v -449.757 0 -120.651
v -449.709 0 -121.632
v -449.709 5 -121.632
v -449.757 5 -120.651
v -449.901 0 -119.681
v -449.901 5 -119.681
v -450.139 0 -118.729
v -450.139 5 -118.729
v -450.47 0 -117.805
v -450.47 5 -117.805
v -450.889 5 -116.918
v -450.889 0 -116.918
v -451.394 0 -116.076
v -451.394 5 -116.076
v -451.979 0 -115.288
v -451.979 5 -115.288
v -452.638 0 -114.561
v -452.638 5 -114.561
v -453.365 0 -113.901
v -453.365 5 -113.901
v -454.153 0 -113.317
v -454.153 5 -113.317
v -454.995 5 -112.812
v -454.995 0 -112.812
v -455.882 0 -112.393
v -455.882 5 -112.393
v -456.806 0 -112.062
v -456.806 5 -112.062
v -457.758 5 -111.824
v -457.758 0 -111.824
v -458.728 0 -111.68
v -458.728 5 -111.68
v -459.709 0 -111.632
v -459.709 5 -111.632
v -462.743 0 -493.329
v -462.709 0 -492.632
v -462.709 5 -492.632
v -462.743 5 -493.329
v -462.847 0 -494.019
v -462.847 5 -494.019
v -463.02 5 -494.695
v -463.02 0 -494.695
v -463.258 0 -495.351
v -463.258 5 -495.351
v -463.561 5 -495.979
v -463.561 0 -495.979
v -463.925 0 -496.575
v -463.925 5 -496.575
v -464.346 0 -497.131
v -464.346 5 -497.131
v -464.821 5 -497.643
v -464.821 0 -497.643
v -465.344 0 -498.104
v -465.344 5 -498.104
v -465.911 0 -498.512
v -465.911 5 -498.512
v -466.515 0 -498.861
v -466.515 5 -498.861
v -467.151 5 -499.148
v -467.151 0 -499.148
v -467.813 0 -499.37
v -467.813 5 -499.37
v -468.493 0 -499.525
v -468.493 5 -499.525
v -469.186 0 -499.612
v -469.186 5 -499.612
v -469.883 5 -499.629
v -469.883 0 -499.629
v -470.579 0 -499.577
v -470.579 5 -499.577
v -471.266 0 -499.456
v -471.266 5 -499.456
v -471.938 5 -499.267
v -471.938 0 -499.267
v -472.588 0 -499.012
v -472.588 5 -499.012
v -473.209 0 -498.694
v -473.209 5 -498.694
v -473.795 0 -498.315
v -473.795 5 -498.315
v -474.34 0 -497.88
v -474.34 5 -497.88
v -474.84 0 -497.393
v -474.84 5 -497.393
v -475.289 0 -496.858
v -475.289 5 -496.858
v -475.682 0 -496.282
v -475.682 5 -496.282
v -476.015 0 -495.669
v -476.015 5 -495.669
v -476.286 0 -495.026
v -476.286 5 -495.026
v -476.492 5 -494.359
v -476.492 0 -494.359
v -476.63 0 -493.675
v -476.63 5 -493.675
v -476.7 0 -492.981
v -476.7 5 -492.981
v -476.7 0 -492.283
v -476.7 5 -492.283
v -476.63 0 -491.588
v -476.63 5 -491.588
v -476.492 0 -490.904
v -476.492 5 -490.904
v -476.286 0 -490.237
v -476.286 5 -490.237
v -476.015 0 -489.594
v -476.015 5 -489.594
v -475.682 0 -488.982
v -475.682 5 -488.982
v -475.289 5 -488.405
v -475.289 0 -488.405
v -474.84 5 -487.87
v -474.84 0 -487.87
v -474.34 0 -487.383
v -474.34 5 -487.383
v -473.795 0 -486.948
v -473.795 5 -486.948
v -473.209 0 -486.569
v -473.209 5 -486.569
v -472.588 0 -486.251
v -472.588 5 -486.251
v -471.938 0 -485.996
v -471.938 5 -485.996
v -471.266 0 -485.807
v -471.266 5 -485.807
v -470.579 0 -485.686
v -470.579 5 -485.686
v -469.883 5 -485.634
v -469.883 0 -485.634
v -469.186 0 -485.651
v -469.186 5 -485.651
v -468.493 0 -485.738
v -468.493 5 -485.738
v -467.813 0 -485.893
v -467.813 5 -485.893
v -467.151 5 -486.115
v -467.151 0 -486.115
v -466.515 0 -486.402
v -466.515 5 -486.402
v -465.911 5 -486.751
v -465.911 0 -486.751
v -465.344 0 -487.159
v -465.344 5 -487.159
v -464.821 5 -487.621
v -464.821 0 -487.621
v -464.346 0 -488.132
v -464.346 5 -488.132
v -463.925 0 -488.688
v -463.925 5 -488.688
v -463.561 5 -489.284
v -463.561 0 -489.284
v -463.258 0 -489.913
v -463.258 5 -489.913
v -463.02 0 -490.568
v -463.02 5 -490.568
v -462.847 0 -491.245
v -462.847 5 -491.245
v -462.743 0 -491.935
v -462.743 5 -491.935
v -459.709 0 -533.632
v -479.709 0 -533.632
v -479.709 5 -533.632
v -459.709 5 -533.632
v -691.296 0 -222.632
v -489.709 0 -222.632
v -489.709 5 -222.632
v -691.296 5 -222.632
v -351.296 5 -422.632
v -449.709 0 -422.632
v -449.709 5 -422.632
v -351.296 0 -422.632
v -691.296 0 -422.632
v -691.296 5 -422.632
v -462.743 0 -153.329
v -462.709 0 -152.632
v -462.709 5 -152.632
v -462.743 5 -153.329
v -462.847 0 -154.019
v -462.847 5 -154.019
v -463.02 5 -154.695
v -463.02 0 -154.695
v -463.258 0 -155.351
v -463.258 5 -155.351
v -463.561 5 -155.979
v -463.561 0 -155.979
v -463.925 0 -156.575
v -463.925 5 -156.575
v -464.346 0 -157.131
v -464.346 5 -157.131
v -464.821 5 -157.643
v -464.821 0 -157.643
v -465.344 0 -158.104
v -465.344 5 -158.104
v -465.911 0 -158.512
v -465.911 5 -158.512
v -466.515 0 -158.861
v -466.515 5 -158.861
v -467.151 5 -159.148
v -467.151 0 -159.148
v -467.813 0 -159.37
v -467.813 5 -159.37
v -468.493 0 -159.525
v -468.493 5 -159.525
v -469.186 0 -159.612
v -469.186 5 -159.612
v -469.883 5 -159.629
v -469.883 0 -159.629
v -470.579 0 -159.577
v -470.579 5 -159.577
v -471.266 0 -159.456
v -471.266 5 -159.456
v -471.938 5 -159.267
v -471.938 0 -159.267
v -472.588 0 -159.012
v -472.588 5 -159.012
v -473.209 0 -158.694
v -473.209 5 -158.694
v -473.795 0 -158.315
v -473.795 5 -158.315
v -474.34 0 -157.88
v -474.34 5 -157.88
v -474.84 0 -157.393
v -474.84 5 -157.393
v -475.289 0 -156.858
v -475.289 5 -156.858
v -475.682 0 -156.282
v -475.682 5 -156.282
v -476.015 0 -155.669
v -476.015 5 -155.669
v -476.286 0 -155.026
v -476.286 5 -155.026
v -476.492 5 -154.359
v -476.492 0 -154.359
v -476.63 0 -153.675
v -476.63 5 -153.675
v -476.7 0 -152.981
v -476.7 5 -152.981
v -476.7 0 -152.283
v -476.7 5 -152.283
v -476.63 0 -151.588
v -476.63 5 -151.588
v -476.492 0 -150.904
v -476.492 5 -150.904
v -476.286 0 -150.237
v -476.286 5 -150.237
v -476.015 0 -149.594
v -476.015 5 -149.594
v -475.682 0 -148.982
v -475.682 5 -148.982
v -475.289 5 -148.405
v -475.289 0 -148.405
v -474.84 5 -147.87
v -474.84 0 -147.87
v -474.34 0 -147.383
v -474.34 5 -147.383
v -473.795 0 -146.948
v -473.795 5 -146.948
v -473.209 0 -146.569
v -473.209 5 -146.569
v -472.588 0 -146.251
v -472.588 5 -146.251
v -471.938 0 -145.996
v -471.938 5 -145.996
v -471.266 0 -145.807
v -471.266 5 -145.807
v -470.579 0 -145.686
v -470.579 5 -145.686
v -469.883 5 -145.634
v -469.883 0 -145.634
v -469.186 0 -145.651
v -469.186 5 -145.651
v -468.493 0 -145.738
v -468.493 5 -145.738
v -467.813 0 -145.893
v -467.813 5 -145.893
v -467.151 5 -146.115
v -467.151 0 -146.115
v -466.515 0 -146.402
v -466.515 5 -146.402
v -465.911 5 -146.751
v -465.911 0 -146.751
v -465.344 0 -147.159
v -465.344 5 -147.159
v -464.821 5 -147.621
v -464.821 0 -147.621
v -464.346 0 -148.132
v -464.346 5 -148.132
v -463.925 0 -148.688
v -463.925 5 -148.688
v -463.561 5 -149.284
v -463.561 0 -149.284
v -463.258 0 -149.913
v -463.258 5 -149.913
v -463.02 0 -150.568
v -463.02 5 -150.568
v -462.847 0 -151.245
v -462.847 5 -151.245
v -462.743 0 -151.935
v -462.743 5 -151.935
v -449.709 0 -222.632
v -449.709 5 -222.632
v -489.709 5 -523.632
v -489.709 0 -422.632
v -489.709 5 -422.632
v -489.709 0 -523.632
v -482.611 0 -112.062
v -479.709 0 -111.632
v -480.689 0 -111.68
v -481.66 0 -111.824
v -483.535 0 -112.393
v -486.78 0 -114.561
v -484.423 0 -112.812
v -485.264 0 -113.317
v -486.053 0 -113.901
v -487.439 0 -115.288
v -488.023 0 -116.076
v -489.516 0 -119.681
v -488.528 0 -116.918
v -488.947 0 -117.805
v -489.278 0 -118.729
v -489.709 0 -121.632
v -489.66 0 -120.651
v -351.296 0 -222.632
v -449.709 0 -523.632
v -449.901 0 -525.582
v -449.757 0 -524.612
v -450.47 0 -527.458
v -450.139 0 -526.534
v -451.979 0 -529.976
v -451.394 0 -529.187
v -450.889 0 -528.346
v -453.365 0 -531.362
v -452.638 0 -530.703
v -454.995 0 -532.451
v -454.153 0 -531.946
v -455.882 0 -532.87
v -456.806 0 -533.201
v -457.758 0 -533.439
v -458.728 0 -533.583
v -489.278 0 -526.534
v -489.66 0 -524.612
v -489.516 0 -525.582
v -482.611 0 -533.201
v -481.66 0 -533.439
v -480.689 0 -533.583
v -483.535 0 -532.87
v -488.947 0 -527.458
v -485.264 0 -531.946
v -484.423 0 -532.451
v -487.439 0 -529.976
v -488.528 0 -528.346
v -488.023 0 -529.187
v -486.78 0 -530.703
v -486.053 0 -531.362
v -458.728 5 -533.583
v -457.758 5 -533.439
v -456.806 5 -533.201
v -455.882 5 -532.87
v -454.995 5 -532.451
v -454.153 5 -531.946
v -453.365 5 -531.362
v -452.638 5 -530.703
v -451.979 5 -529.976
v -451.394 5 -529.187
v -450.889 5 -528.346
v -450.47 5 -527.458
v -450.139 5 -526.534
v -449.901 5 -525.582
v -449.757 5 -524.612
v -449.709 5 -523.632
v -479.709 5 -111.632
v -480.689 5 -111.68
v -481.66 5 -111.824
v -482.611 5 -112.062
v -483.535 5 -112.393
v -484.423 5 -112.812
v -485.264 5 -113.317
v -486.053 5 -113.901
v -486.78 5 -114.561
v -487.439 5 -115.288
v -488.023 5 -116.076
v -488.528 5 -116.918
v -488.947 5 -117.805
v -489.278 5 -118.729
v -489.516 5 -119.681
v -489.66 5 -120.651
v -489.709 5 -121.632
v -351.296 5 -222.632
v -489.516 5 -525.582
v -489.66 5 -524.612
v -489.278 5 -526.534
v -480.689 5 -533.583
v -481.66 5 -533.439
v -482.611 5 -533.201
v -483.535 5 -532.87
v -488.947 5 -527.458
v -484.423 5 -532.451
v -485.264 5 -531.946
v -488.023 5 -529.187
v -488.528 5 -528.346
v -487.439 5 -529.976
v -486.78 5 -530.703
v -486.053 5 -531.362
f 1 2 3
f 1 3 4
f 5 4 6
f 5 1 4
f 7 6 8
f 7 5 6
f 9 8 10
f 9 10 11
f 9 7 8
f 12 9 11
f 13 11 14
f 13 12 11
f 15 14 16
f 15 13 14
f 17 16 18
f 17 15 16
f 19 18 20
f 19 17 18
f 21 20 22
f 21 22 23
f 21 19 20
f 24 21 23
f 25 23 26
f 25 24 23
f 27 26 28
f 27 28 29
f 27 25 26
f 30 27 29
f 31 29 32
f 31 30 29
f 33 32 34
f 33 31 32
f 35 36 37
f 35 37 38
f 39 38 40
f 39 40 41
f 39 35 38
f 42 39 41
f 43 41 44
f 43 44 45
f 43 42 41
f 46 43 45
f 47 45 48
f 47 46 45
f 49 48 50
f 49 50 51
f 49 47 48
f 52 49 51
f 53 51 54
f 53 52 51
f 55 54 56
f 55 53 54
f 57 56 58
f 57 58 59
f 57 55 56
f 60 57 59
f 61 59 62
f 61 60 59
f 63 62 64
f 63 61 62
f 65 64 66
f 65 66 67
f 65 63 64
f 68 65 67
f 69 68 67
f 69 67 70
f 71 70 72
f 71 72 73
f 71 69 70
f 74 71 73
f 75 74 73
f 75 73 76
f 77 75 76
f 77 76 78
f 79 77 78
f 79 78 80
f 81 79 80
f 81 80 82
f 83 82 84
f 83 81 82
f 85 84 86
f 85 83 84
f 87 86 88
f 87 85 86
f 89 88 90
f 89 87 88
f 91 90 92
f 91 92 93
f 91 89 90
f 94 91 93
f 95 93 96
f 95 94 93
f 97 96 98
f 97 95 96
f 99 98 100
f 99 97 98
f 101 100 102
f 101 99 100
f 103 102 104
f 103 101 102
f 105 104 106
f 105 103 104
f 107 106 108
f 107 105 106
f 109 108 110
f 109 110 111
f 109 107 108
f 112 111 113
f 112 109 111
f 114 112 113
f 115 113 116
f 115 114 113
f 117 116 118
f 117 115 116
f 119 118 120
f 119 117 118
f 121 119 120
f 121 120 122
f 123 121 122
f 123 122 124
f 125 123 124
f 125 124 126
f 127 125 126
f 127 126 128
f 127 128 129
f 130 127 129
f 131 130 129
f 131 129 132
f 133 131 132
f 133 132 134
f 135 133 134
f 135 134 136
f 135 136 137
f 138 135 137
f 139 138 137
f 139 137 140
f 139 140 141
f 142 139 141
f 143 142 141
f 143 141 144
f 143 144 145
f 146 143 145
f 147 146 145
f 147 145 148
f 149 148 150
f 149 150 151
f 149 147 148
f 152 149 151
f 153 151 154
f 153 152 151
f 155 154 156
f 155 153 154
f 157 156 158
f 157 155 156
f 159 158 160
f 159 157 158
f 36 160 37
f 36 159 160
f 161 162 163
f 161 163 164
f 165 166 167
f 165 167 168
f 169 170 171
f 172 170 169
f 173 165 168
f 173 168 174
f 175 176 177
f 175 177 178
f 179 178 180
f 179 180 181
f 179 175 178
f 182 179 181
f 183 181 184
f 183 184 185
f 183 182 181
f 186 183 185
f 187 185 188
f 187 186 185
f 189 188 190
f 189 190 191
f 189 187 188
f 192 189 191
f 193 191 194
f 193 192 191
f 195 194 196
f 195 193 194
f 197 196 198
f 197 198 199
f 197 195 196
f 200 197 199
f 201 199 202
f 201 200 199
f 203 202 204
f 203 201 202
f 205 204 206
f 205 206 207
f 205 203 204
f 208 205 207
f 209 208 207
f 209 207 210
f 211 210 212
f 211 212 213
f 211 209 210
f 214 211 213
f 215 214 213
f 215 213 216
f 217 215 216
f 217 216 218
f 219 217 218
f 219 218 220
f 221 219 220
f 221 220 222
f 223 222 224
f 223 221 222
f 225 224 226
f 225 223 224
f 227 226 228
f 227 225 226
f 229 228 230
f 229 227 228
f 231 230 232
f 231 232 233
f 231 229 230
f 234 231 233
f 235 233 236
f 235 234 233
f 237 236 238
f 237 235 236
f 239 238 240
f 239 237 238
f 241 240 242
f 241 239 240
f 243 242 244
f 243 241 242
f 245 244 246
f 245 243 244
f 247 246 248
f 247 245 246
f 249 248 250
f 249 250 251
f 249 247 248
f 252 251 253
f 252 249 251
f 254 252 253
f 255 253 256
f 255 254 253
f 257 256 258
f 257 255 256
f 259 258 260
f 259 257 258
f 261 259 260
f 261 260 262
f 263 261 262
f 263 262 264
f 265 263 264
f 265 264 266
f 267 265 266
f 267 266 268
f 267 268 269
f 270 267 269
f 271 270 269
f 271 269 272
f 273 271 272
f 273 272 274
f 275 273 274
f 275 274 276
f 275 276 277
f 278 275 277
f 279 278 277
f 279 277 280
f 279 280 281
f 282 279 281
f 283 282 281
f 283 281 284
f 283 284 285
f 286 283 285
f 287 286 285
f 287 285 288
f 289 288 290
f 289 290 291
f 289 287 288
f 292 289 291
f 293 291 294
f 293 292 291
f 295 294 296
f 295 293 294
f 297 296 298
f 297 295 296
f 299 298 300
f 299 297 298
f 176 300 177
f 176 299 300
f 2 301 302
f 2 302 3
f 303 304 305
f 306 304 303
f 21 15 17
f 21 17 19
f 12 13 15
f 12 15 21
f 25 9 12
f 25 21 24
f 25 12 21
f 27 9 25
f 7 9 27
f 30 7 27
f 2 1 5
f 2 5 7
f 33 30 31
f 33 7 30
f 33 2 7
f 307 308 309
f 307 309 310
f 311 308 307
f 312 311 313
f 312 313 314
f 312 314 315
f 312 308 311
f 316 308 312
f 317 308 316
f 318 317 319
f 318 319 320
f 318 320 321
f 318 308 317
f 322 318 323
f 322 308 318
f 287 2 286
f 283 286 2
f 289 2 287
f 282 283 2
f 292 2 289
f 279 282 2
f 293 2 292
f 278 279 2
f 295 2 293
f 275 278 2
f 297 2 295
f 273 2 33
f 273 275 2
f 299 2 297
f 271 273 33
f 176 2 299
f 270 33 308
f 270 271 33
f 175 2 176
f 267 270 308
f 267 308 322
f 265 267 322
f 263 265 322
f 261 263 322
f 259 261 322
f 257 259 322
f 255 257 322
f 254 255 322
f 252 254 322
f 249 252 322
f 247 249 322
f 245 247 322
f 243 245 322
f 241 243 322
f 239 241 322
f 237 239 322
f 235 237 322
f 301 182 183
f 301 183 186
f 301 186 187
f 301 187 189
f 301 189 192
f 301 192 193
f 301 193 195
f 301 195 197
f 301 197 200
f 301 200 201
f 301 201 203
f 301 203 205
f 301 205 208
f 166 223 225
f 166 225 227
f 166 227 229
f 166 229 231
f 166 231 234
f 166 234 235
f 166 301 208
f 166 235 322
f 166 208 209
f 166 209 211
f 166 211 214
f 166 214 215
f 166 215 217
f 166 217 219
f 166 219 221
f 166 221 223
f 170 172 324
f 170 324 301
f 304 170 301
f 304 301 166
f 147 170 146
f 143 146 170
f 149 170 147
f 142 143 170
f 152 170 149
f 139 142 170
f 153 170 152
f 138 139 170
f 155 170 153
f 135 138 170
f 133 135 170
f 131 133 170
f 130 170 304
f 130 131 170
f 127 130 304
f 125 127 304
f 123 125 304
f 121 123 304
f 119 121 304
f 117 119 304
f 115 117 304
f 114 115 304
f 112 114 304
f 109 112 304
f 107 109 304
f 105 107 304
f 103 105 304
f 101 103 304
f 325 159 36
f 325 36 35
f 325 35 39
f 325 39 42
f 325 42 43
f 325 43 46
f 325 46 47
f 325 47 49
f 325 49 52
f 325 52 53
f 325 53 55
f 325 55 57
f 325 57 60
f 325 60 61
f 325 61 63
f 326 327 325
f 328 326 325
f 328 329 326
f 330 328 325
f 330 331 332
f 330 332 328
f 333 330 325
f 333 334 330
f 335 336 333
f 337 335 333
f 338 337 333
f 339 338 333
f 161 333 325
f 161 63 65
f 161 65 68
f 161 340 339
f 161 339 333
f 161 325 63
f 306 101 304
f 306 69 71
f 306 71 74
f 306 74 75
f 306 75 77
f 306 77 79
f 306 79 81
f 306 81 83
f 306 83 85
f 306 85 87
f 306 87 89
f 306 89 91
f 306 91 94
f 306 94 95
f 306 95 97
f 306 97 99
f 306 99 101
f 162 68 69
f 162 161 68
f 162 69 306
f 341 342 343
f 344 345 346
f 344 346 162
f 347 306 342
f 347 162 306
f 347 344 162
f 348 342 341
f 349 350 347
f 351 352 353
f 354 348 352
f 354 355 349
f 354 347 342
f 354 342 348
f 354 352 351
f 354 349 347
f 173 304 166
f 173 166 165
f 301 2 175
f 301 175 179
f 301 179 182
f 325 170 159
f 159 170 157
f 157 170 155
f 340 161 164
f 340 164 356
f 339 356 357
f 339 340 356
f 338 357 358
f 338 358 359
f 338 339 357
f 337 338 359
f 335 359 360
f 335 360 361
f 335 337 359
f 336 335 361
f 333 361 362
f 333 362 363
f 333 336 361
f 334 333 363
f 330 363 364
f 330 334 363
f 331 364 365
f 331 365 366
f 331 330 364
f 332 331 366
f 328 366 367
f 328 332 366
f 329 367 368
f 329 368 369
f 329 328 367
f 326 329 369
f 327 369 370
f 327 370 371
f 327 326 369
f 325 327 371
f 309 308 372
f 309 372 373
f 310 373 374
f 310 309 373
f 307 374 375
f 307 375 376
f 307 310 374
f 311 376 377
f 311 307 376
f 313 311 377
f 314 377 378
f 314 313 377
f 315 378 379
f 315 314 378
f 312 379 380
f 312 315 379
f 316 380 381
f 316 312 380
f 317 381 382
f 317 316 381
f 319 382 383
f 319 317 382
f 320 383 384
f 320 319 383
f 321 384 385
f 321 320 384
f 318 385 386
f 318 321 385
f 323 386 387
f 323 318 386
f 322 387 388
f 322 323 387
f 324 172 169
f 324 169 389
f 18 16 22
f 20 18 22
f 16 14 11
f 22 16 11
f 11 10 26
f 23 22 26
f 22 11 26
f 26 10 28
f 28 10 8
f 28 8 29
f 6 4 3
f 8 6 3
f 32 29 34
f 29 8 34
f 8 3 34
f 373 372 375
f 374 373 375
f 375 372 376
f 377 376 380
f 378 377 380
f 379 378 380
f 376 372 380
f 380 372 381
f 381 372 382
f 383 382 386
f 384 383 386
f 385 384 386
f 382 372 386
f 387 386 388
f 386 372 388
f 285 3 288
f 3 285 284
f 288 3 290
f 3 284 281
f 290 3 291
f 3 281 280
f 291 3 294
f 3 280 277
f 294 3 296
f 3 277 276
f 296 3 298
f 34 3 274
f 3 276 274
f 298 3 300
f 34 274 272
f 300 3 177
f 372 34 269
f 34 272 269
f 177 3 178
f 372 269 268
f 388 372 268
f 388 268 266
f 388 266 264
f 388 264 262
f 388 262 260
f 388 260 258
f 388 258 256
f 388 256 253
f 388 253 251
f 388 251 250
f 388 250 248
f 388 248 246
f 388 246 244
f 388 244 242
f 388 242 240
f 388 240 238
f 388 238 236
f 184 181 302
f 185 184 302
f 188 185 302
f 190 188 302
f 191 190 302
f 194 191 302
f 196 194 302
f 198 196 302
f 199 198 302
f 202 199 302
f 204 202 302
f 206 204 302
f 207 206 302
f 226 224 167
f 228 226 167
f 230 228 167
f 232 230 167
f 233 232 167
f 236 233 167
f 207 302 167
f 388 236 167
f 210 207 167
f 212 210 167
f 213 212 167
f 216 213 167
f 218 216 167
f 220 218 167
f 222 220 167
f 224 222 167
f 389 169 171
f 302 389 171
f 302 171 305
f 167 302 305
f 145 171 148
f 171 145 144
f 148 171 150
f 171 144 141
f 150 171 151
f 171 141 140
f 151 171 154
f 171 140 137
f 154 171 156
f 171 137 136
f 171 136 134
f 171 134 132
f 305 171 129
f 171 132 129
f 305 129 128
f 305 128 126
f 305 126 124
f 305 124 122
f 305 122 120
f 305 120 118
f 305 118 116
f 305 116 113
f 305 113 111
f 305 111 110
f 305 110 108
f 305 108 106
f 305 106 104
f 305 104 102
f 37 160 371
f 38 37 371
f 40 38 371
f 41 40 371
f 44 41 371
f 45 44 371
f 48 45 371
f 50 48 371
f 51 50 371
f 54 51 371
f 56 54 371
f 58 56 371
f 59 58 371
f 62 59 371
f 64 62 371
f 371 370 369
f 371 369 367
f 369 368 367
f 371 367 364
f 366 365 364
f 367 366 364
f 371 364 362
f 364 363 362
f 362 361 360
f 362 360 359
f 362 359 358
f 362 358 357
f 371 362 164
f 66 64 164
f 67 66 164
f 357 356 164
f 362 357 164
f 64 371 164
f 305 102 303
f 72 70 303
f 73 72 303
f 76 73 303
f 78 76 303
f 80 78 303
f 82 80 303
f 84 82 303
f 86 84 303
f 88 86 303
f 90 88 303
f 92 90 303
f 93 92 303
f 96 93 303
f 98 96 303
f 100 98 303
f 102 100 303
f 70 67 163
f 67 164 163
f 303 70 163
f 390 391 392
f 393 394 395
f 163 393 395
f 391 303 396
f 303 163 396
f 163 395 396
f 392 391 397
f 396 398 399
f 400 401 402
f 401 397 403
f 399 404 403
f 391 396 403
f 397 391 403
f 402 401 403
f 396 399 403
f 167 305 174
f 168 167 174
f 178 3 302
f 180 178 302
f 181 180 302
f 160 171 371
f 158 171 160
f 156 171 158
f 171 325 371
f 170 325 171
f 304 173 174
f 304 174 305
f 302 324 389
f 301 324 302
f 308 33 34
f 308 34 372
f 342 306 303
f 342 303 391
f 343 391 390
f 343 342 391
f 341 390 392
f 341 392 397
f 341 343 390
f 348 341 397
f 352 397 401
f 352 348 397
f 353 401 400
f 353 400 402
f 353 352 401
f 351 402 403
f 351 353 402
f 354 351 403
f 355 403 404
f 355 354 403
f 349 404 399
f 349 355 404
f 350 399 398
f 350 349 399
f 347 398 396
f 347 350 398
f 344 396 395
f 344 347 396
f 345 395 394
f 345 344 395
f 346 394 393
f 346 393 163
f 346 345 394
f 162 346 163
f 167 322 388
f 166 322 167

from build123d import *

# Parameters (mm, degrees)
SKETCH1_R           = 7
BOSS_EXTRUDE1_DEPTH = 5


with BuildPart() as part:
    # Sketch1 → Boss-Extrude1 (new body)
    with BuildSketch(Plane(origin=(0, 0, 0), x_dir=(1, 0, 0), z_dir=(0, 1, 0))):
        with BuildLine():
            Line((-449.708642176, 422.631578947), (-351.296475424, 422.631578947))
            Line((-351.296475424, 422.631578947), (-351.296475424, 222.631578947))
            Line((-351.296475424, 222.631578947), (-449.708642176, 222.631578947))
            Line((-449.708642176, 222.631578947), (-449.708642176, 121.631578947))
            ThreePointArc((-449.708642176, 121.631578947), (-452.637574364, 114.560511136), (-459.708642176, 111.631578947))
            Line((-459.708642176, 111.631578947), (-479.708642176, 111.631578947))
            ThreePointArc((-479.708642176, 111.631578947), (-486.779709988, 114.560511136), (-489.708642176, 121.631578947))
            Line((-489.708642176, 121.631578947), (-489.708642176, 222.631578947))
            Line((-489.708642176, 222.631578947), (-691.296475424, 222.631578947))
            Line((-691.296475424, 222.631578947), (-691.296475424, 422.631578947))
            Line((-691.296475424, 422.631578947), (-489.708642176, 422.631578947))
            Line((-489.708642176, 422.631578947), (-489.708642176, 523.631578947))
            ThreePointArc((-489.708642176, 523.631578947), (-486.779709988, 530.702646759), (-479.708642176, 533.631578947))
            Line((-479.708642176, 533.631578947), (-459.708642176, 533.631578947))
            ThreePointArc((-459.708642176, 533.631578947), (-452.637574364, 530.702646759), (-449.708642176, 523.631578947))
            Line((-449.708642176, 523.631578947), (-449.708642176, 422.631578947))
        make_face()
        with Locations((-469.708642176, 492.631578947)):
            Circle(SKETCH1_R, mode=Mode.SUBTRACT)
        with Locations((-469.708642176, 152.631578947)):
            Circle(SKETCH1_R, mode=Mode.SUBTRACT)
    extrude(amount=BOSS_EXTRUDE1_DEPTH)


solid = part.part
